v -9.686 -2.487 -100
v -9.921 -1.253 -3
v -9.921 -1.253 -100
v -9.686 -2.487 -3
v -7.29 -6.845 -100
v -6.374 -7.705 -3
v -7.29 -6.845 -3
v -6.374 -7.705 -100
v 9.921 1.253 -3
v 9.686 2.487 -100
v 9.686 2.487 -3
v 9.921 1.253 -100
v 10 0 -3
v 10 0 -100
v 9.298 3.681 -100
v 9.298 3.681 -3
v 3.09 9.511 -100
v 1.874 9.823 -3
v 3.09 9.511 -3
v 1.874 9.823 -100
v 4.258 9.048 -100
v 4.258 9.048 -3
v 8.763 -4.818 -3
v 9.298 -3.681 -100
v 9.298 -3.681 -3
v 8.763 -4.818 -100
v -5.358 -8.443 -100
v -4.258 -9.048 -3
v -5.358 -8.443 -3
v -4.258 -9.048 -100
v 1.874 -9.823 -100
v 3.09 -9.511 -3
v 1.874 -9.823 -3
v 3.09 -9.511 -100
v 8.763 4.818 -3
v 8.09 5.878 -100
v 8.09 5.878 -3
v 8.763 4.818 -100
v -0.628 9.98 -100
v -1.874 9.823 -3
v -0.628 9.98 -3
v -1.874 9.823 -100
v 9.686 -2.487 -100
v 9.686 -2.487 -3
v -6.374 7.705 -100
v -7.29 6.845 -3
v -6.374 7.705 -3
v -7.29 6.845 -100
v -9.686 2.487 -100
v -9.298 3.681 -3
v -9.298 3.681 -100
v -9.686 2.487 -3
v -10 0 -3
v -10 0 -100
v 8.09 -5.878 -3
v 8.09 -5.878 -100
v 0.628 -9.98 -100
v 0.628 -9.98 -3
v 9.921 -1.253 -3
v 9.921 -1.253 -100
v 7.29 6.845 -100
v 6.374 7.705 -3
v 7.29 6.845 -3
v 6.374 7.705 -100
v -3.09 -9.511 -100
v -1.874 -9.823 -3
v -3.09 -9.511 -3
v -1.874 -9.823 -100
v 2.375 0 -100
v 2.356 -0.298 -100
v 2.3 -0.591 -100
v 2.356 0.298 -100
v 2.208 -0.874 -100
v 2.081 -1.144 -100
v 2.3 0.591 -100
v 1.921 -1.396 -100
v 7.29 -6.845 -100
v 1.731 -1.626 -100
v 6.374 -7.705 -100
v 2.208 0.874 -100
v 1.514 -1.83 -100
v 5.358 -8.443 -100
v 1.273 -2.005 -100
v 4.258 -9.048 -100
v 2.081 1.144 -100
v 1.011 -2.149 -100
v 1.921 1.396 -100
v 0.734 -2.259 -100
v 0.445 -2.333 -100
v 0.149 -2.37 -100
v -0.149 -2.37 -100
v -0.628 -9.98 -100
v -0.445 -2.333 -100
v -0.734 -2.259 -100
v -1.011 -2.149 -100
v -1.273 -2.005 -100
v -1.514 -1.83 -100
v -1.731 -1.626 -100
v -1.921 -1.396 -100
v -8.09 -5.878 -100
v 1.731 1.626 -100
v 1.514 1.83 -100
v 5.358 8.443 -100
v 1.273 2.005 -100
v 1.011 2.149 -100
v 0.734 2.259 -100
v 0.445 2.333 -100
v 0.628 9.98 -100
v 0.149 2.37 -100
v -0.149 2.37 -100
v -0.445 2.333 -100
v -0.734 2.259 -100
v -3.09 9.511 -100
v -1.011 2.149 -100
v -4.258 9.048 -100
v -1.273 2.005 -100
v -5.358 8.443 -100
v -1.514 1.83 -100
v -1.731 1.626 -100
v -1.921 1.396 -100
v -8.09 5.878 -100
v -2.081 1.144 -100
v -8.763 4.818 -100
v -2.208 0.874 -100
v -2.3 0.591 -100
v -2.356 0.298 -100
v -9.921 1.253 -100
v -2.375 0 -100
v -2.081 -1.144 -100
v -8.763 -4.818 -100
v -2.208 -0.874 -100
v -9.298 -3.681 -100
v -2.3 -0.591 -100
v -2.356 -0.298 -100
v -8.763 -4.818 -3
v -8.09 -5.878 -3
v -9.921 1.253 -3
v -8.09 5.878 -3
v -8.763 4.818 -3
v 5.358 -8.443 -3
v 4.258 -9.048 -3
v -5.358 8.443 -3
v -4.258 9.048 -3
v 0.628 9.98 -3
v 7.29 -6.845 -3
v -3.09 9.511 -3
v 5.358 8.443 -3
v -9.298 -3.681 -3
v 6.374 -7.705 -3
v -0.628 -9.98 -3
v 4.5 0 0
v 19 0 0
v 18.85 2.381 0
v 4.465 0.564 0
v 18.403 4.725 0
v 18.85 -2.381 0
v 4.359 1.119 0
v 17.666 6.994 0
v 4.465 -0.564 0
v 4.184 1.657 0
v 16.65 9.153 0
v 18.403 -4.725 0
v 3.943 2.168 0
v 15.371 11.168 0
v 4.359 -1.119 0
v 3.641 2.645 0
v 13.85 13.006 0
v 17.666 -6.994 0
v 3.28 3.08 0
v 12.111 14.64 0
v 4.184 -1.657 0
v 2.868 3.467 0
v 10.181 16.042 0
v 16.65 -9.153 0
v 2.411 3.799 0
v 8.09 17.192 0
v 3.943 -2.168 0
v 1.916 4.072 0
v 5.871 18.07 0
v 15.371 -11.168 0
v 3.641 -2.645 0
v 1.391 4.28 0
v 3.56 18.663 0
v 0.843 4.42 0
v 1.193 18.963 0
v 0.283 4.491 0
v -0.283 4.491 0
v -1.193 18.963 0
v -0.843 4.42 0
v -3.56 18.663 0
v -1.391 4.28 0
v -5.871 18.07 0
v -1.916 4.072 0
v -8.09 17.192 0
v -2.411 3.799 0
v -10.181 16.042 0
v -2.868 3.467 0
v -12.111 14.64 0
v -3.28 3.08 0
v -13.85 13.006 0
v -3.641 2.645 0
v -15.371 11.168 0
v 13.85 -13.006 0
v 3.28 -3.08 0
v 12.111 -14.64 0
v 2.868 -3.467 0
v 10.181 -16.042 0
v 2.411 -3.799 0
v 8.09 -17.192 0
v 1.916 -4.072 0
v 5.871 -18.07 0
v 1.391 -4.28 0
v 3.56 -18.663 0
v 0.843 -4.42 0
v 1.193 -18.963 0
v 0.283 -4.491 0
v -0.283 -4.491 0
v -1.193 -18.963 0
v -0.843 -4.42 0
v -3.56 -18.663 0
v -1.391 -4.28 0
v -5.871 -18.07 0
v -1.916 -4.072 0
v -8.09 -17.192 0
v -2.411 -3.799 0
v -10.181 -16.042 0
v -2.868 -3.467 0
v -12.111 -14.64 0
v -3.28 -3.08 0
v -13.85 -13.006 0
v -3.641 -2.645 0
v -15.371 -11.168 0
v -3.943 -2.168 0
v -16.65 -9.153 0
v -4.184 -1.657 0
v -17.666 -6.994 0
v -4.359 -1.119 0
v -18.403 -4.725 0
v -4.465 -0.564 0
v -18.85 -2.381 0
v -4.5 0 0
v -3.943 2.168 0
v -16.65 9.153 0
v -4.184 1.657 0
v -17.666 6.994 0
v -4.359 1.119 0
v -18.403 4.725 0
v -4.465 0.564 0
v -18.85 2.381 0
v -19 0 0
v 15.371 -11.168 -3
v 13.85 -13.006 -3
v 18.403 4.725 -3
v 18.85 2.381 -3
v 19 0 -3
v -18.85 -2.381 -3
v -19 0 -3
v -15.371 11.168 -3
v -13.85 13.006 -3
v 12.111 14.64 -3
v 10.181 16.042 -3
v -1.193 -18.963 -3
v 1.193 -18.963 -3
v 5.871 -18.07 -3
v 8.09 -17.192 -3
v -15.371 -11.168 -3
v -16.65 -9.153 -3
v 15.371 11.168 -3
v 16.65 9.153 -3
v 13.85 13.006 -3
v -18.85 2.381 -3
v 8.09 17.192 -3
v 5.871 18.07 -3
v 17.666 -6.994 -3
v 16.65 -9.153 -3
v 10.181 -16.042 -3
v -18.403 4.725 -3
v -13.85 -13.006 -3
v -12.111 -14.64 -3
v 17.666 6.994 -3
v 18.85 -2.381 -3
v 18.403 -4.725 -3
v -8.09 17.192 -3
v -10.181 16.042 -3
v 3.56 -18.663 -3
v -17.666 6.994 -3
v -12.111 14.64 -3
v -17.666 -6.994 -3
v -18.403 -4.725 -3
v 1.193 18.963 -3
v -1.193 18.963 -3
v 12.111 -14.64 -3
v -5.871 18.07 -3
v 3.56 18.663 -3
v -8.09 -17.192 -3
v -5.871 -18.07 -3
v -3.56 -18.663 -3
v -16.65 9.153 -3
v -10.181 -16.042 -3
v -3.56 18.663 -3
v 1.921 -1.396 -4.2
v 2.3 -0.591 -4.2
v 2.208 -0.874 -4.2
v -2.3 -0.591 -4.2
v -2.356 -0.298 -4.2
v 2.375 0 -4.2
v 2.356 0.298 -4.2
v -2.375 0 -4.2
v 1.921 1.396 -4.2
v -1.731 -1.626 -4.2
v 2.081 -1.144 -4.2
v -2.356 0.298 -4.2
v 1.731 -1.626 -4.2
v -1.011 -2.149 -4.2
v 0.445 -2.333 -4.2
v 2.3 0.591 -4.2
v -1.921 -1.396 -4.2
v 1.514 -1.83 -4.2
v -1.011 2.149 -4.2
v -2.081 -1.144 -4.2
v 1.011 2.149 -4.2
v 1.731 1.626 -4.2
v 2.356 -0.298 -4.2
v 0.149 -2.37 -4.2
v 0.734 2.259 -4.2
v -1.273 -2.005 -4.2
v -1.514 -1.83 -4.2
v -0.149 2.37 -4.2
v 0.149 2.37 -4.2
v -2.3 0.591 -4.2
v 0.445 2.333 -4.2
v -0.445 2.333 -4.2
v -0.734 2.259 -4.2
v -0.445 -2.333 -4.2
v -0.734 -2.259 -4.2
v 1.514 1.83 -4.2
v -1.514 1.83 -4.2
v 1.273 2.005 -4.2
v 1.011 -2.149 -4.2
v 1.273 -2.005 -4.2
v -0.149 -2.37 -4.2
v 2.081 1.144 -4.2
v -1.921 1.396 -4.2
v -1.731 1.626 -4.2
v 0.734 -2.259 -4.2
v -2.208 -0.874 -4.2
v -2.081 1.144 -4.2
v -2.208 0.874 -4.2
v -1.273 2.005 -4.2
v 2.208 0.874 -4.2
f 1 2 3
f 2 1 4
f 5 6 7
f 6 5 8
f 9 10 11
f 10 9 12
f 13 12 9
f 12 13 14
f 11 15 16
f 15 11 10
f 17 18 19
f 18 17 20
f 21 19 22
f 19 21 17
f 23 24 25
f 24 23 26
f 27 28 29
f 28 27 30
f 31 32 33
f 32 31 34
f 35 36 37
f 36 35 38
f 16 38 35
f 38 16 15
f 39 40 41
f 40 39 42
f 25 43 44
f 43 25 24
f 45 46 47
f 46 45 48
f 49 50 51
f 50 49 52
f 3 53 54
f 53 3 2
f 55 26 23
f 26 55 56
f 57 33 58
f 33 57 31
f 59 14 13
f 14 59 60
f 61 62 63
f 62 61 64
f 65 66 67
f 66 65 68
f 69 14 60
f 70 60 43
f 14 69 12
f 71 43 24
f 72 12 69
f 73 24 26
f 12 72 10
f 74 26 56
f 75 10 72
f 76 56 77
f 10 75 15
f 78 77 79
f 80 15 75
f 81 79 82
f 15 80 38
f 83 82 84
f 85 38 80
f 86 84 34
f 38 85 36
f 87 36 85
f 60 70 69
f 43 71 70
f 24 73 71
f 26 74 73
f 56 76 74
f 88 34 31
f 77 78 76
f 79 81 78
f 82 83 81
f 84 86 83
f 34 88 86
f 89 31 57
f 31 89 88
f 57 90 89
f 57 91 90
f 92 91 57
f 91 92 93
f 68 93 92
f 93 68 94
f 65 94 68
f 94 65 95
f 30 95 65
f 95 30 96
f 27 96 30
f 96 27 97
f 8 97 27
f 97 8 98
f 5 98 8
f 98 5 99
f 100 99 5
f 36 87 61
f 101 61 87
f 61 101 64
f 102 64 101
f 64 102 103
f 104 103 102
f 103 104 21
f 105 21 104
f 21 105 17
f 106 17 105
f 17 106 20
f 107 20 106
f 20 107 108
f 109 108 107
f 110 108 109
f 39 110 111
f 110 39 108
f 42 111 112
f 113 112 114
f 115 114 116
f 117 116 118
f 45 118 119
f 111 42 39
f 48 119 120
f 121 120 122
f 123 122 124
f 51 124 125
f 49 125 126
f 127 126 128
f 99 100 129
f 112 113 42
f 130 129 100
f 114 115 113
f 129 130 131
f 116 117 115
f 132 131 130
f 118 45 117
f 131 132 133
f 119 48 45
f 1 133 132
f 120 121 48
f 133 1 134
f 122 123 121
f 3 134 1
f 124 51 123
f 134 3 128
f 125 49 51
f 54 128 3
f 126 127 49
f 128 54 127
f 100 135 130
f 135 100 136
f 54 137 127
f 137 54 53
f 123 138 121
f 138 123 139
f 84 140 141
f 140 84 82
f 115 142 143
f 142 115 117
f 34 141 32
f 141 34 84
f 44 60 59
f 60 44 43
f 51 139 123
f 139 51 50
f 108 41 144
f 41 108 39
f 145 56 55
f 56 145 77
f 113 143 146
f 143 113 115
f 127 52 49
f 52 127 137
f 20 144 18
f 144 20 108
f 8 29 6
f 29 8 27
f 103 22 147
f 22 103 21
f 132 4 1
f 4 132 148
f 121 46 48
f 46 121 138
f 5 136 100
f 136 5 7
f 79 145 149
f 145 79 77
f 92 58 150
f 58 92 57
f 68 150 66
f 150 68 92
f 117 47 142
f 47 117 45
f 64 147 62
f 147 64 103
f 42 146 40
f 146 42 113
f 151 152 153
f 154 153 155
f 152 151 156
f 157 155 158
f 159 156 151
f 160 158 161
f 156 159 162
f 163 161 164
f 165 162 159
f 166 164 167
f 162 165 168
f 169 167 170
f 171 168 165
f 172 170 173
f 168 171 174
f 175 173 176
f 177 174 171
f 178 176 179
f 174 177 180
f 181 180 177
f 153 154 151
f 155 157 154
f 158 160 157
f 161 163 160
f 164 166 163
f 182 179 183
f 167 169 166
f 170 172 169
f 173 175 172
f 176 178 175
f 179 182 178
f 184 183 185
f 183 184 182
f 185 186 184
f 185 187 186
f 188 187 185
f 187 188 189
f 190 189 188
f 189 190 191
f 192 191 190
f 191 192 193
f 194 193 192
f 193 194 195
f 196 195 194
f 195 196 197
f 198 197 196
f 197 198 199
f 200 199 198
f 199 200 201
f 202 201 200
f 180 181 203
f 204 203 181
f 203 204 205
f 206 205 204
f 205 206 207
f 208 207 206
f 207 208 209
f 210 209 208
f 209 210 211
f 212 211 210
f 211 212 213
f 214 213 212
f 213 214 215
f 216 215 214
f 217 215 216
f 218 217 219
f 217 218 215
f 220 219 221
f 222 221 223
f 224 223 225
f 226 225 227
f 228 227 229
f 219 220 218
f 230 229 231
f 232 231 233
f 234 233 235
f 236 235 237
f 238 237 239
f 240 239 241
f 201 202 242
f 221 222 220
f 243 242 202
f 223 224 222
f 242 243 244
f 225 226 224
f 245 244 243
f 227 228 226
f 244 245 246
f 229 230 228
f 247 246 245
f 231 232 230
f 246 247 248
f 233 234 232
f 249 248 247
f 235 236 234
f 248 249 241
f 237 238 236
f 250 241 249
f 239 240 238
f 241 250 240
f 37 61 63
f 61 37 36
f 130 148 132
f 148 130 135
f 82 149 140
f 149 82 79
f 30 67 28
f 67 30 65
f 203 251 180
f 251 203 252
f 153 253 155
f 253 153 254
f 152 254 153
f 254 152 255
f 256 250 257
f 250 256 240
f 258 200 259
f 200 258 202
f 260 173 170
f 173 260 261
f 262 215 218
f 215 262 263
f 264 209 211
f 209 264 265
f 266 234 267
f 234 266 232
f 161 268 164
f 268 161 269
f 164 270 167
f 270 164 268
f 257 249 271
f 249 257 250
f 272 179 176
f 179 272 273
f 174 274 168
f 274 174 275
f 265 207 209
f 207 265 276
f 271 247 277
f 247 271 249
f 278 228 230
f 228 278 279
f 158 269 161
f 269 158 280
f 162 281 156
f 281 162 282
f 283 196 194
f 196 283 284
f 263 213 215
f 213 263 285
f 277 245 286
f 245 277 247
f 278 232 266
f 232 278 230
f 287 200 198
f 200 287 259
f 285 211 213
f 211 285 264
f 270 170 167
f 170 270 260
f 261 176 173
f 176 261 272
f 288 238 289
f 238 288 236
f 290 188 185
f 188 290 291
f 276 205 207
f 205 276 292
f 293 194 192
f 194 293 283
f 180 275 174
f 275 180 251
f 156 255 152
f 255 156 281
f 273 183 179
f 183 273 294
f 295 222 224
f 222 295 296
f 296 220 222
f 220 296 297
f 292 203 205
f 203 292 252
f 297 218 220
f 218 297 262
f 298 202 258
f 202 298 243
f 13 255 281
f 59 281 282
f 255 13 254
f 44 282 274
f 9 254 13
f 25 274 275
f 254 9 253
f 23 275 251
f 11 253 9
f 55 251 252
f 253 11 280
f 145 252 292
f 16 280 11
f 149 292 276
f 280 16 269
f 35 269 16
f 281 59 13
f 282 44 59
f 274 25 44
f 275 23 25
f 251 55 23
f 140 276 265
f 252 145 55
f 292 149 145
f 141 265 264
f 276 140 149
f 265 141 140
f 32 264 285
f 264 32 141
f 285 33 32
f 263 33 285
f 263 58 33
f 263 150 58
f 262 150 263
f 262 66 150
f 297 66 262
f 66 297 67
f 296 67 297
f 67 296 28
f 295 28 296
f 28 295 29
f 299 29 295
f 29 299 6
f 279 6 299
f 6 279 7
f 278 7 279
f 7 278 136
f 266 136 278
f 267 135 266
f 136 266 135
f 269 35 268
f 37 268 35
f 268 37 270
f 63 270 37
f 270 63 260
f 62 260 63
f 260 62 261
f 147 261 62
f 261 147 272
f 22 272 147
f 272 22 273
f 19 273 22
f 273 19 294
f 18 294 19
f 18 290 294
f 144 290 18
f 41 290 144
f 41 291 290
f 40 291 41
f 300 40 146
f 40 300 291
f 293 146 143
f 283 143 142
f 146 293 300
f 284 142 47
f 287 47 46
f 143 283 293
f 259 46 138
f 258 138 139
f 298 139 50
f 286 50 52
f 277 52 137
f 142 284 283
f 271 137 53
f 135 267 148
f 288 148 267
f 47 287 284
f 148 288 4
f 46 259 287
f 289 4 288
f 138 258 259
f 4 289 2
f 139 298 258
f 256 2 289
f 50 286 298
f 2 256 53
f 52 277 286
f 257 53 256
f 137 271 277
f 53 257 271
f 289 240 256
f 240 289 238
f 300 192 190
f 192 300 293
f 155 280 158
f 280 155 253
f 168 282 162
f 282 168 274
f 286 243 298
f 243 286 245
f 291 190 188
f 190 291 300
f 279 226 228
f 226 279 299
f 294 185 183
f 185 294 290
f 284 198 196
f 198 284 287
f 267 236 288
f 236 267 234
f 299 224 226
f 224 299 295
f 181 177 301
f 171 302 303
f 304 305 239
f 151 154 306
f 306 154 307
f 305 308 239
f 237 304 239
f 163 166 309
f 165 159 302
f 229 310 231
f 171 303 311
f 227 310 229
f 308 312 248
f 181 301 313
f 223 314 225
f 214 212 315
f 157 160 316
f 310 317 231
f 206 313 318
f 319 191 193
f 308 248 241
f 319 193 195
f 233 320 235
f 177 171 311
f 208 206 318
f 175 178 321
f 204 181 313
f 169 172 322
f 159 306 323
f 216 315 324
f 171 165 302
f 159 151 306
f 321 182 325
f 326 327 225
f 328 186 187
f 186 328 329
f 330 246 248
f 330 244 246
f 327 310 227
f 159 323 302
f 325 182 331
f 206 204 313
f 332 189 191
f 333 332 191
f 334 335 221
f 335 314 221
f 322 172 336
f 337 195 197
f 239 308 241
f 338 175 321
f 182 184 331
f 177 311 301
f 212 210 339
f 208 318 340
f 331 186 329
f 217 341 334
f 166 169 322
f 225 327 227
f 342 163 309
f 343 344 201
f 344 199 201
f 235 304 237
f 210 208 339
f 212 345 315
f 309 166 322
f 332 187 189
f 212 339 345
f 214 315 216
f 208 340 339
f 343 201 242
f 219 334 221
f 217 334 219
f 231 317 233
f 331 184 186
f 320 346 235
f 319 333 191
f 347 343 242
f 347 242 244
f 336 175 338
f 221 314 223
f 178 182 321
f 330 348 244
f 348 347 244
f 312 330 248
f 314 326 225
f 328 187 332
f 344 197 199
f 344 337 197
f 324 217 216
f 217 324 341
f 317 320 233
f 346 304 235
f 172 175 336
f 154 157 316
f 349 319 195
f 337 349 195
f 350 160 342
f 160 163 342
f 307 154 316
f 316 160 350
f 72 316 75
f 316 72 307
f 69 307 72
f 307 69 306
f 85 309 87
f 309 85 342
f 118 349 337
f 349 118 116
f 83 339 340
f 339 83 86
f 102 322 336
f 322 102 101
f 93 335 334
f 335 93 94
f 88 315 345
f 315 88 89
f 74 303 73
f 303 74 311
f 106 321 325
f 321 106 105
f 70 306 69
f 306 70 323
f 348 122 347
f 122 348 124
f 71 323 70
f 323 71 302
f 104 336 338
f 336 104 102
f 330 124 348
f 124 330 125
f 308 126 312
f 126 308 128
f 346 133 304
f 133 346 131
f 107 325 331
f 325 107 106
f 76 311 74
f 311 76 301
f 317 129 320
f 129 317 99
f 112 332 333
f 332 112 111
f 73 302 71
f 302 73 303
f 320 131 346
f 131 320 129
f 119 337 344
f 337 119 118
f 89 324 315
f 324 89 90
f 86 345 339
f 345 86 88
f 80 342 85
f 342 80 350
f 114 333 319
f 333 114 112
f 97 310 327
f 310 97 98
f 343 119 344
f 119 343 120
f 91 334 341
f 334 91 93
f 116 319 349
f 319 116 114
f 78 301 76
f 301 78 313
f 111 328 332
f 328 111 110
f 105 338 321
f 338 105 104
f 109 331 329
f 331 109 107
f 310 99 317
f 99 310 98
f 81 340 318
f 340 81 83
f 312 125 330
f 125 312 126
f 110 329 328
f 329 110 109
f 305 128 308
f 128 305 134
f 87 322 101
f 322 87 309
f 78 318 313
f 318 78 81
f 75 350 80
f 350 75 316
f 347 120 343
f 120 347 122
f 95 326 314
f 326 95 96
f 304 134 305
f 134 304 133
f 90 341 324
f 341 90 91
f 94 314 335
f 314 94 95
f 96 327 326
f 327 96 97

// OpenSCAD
$fn = 50;


difference() {
	union() {
		translate(v = [0, 0, -100.0000000000]) {
			cylinder(h = 100, r = 10.0000000000);
		}
		translate(v = [0, 0, -3.0000000000]) {
			cylinder(h = 3, r = 19.0000000000);
		}
	}
	union() {
		translate(v = [0, 0, 0]) {
			rotate(a = [0, 0, 0]) {
				difference() {
					union() {
						#translate(v = [0, 0, -100.0000000000]) {
							cylinder(h = 100, r = 2.2500000000);
						}
						#translate(v = [0, 0, -4.2000000000]) {
							cylinder(h = 4.2000000000, r = 10.0000000000, r1 = 2.3750000000, r2 = 4.5000000000);
						}
						#translate(v = [0, 0, -100.0000000000]) {
							cylinder(h = 100, r = 2.3750000000);
						}
						#translate(v = [0, 0, -100.0000000000]) {
							cylinder(h = 100, r = 2.2500000000);
						}
					}
					union();
				}
			}
		}
	}
}
